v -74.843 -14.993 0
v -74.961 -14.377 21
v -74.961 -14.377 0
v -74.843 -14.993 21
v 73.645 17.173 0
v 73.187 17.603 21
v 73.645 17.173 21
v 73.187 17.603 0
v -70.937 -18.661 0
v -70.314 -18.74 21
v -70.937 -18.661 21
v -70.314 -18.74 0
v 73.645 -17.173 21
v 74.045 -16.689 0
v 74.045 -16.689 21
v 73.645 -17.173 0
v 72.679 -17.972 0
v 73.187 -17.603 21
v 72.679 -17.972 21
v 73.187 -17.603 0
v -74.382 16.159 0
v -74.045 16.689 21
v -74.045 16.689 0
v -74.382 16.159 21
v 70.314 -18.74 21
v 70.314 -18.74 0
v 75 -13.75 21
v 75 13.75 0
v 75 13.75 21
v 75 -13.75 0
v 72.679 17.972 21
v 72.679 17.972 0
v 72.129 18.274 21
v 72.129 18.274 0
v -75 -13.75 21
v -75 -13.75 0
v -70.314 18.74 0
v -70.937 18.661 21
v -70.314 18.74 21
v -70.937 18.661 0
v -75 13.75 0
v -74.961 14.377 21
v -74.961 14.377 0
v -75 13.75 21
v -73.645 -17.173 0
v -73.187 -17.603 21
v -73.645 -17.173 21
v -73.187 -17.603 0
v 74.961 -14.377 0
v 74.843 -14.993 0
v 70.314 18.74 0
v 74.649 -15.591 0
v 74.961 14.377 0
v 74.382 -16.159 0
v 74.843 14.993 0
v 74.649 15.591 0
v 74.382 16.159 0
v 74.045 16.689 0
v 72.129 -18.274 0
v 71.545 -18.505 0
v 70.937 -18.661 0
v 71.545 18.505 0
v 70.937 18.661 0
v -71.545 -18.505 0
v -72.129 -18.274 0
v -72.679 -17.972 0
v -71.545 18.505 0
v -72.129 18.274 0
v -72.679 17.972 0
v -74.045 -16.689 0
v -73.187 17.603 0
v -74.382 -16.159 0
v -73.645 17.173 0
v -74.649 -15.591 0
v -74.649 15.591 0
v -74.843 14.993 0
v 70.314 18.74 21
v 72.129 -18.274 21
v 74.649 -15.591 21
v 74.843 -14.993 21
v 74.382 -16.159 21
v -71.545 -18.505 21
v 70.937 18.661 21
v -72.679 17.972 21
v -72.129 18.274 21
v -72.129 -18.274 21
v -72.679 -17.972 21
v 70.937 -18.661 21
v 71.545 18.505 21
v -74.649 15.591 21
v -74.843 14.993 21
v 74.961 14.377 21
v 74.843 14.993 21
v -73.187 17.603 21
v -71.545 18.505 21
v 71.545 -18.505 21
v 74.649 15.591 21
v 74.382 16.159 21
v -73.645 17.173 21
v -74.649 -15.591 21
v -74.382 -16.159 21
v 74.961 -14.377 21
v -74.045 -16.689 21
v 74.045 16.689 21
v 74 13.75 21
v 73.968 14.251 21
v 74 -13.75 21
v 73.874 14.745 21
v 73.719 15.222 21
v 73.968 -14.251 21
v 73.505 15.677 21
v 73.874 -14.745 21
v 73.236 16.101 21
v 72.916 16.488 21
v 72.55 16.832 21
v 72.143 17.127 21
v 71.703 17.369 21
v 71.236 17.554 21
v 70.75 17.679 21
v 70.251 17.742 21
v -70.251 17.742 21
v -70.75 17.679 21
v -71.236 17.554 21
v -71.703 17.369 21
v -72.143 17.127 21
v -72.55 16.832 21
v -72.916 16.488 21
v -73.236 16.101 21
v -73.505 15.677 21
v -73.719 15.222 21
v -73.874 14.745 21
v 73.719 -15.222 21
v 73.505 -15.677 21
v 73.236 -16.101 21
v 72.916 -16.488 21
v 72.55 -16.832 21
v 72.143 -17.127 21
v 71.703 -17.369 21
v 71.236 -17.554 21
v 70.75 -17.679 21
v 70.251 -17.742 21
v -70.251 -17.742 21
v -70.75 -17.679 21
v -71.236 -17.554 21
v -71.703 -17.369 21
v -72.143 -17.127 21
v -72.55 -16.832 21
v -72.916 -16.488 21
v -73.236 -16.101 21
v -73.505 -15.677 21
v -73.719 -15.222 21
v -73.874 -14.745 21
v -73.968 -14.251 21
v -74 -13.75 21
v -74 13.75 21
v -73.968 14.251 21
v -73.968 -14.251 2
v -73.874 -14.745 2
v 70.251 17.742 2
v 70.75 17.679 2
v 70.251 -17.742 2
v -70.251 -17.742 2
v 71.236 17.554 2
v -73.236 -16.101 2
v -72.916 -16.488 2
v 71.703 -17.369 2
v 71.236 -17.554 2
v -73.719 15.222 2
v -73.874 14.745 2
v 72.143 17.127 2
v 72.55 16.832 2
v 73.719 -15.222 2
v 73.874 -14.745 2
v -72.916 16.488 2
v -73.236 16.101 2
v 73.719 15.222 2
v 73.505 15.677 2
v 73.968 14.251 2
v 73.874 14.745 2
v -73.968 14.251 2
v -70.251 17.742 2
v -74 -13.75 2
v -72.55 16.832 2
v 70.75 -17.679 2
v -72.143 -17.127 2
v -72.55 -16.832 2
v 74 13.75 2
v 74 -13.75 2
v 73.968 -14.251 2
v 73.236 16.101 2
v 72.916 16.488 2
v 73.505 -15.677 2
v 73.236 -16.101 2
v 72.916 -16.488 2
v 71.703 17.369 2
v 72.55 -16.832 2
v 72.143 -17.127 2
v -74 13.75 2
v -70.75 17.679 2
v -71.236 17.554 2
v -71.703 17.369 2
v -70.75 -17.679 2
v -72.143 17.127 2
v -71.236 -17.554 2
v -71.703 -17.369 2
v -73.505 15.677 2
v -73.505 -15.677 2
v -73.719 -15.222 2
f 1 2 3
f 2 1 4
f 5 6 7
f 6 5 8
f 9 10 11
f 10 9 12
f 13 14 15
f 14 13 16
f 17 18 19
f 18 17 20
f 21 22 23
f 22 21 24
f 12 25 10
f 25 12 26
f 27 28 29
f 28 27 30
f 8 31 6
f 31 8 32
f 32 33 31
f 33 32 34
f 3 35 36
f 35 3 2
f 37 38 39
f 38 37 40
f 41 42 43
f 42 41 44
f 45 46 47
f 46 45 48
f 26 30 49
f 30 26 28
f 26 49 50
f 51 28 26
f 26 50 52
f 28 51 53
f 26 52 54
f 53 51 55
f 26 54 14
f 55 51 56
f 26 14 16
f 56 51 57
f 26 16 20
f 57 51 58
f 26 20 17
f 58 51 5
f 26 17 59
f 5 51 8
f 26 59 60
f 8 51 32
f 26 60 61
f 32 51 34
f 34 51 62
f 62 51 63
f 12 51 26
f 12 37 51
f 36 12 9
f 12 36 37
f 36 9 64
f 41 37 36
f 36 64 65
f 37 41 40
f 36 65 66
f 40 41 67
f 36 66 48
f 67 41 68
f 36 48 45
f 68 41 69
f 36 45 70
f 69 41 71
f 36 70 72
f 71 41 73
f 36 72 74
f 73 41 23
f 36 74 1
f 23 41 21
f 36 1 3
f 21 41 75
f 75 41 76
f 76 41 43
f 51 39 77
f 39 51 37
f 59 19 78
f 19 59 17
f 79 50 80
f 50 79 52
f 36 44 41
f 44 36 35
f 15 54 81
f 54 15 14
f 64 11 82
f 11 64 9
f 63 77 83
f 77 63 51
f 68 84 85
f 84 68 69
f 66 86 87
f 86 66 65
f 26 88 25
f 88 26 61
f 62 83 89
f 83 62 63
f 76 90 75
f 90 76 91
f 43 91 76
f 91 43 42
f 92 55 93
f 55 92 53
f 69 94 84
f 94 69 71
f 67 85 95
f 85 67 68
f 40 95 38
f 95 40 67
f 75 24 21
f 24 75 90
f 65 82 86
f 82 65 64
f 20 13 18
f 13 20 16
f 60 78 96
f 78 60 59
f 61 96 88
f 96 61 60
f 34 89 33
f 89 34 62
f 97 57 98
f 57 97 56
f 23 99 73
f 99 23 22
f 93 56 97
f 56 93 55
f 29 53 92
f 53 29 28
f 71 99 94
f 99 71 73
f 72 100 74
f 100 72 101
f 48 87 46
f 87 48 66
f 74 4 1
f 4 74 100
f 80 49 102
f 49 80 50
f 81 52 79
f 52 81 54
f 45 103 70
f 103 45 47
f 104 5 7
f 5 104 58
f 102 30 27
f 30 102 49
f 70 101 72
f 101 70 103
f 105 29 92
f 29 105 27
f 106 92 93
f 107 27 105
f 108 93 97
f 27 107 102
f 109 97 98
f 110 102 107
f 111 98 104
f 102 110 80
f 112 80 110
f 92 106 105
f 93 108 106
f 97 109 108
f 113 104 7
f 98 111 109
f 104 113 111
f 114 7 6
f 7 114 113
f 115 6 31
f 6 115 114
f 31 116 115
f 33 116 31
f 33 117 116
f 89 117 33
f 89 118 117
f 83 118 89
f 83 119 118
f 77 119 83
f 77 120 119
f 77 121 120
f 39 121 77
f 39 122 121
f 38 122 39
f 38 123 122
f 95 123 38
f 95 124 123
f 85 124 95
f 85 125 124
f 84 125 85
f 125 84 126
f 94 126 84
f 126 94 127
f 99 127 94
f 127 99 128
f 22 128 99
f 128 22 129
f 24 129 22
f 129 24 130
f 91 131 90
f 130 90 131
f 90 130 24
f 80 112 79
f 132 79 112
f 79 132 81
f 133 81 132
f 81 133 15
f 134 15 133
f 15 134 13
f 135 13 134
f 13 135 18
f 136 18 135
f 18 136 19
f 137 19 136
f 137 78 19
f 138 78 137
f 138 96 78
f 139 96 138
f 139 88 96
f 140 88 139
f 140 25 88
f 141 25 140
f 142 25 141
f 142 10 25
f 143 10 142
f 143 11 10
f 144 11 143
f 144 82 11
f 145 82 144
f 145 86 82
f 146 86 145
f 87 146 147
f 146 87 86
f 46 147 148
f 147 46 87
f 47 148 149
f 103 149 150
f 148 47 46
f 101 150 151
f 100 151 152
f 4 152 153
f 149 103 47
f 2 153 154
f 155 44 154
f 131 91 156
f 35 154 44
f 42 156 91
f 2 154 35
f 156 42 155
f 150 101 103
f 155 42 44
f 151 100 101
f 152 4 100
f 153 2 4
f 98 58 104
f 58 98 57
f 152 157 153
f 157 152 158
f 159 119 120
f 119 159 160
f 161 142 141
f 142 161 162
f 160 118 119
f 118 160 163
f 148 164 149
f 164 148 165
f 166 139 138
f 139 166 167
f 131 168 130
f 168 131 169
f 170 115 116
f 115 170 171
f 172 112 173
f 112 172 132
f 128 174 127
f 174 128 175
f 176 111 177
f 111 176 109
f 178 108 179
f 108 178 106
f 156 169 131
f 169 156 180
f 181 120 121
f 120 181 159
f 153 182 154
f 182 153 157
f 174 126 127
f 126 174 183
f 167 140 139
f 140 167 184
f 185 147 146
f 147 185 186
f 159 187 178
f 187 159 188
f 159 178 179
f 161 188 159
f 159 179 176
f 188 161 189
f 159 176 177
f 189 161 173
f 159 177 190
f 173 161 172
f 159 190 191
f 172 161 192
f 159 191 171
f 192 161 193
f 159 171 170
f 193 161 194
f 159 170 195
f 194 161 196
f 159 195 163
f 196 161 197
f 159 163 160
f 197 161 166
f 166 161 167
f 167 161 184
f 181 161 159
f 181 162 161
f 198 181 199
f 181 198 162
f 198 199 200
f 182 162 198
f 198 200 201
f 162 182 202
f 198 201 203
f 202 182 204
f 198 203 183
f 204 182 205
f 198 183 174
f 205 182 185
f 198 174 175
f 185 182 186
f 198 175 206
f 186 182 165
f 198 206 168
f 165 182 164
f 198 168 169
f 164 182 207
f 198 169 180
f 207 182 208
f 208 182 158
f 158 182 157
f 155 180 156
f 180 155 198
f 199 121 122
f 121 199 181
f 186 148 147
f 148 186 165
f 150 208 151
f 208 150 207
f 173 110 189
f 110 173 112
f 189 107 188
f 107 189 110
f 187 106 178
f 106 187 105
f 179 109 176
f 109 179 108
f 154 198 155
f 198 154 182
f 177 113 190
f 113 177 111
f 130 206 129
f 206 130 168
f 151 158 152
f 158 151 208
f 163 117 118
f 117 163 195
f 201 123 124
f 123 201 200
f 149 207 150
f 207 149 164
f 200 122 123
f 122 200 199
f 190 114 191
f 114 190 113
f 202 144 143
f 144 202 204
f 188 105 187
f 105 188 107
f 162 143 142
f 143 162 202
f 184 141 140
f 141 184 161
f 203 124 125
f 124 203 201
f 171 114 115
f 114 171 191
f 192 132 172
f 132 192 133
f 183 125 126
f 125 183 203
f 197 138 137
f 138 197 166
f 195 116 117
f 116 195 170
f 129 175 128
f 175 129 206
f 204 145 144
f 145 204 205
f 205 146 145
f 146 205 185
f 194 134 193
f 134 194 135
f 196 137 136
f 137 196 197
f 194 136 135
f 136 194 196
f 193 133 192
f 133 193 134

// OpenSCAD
$fn = 50;


difference() {
	union() {
		hull() {
			translate(v = [-70.0000000000, 13.7500000000, 0]) {
				cylinder(h = 21, r = 5);
			}
			translate(v = [70.0000000000, 13.7500000000, 0]) {
				cylinder(h = 21, r = 5);
			}
			translate(v = [-70.0000000000, -13.7500000000, 0]) {
				cylinder(h = 21, r = 5);
			}
			translate(v = [70.0000000000, -13.7500000000, 0]) {
				cylinder(h = 21, r = 5);
			}
		}
	}
	union() {
		translate(v = [0, 0, 2]) {
			hull() {
				translate(v = [-70.0000000000, 13.7500000000, 0]) {
					cylinder(h = 19, r = 4);
				}
				translate(v = [70.0000000000, 13.7500000000, 0]) {
					cylinder(h = 19, r = 4);
				}
				translate(v = [-70.0000000000, -13.7500000000, 0]) {
					cylinder(h = 19, r = 4);
				}
				translate(v = [70.0000000000, -13.7500000000, 0]) {
					cylinder(h = 19, r = 4);
				}
			}
		}
	}
}
